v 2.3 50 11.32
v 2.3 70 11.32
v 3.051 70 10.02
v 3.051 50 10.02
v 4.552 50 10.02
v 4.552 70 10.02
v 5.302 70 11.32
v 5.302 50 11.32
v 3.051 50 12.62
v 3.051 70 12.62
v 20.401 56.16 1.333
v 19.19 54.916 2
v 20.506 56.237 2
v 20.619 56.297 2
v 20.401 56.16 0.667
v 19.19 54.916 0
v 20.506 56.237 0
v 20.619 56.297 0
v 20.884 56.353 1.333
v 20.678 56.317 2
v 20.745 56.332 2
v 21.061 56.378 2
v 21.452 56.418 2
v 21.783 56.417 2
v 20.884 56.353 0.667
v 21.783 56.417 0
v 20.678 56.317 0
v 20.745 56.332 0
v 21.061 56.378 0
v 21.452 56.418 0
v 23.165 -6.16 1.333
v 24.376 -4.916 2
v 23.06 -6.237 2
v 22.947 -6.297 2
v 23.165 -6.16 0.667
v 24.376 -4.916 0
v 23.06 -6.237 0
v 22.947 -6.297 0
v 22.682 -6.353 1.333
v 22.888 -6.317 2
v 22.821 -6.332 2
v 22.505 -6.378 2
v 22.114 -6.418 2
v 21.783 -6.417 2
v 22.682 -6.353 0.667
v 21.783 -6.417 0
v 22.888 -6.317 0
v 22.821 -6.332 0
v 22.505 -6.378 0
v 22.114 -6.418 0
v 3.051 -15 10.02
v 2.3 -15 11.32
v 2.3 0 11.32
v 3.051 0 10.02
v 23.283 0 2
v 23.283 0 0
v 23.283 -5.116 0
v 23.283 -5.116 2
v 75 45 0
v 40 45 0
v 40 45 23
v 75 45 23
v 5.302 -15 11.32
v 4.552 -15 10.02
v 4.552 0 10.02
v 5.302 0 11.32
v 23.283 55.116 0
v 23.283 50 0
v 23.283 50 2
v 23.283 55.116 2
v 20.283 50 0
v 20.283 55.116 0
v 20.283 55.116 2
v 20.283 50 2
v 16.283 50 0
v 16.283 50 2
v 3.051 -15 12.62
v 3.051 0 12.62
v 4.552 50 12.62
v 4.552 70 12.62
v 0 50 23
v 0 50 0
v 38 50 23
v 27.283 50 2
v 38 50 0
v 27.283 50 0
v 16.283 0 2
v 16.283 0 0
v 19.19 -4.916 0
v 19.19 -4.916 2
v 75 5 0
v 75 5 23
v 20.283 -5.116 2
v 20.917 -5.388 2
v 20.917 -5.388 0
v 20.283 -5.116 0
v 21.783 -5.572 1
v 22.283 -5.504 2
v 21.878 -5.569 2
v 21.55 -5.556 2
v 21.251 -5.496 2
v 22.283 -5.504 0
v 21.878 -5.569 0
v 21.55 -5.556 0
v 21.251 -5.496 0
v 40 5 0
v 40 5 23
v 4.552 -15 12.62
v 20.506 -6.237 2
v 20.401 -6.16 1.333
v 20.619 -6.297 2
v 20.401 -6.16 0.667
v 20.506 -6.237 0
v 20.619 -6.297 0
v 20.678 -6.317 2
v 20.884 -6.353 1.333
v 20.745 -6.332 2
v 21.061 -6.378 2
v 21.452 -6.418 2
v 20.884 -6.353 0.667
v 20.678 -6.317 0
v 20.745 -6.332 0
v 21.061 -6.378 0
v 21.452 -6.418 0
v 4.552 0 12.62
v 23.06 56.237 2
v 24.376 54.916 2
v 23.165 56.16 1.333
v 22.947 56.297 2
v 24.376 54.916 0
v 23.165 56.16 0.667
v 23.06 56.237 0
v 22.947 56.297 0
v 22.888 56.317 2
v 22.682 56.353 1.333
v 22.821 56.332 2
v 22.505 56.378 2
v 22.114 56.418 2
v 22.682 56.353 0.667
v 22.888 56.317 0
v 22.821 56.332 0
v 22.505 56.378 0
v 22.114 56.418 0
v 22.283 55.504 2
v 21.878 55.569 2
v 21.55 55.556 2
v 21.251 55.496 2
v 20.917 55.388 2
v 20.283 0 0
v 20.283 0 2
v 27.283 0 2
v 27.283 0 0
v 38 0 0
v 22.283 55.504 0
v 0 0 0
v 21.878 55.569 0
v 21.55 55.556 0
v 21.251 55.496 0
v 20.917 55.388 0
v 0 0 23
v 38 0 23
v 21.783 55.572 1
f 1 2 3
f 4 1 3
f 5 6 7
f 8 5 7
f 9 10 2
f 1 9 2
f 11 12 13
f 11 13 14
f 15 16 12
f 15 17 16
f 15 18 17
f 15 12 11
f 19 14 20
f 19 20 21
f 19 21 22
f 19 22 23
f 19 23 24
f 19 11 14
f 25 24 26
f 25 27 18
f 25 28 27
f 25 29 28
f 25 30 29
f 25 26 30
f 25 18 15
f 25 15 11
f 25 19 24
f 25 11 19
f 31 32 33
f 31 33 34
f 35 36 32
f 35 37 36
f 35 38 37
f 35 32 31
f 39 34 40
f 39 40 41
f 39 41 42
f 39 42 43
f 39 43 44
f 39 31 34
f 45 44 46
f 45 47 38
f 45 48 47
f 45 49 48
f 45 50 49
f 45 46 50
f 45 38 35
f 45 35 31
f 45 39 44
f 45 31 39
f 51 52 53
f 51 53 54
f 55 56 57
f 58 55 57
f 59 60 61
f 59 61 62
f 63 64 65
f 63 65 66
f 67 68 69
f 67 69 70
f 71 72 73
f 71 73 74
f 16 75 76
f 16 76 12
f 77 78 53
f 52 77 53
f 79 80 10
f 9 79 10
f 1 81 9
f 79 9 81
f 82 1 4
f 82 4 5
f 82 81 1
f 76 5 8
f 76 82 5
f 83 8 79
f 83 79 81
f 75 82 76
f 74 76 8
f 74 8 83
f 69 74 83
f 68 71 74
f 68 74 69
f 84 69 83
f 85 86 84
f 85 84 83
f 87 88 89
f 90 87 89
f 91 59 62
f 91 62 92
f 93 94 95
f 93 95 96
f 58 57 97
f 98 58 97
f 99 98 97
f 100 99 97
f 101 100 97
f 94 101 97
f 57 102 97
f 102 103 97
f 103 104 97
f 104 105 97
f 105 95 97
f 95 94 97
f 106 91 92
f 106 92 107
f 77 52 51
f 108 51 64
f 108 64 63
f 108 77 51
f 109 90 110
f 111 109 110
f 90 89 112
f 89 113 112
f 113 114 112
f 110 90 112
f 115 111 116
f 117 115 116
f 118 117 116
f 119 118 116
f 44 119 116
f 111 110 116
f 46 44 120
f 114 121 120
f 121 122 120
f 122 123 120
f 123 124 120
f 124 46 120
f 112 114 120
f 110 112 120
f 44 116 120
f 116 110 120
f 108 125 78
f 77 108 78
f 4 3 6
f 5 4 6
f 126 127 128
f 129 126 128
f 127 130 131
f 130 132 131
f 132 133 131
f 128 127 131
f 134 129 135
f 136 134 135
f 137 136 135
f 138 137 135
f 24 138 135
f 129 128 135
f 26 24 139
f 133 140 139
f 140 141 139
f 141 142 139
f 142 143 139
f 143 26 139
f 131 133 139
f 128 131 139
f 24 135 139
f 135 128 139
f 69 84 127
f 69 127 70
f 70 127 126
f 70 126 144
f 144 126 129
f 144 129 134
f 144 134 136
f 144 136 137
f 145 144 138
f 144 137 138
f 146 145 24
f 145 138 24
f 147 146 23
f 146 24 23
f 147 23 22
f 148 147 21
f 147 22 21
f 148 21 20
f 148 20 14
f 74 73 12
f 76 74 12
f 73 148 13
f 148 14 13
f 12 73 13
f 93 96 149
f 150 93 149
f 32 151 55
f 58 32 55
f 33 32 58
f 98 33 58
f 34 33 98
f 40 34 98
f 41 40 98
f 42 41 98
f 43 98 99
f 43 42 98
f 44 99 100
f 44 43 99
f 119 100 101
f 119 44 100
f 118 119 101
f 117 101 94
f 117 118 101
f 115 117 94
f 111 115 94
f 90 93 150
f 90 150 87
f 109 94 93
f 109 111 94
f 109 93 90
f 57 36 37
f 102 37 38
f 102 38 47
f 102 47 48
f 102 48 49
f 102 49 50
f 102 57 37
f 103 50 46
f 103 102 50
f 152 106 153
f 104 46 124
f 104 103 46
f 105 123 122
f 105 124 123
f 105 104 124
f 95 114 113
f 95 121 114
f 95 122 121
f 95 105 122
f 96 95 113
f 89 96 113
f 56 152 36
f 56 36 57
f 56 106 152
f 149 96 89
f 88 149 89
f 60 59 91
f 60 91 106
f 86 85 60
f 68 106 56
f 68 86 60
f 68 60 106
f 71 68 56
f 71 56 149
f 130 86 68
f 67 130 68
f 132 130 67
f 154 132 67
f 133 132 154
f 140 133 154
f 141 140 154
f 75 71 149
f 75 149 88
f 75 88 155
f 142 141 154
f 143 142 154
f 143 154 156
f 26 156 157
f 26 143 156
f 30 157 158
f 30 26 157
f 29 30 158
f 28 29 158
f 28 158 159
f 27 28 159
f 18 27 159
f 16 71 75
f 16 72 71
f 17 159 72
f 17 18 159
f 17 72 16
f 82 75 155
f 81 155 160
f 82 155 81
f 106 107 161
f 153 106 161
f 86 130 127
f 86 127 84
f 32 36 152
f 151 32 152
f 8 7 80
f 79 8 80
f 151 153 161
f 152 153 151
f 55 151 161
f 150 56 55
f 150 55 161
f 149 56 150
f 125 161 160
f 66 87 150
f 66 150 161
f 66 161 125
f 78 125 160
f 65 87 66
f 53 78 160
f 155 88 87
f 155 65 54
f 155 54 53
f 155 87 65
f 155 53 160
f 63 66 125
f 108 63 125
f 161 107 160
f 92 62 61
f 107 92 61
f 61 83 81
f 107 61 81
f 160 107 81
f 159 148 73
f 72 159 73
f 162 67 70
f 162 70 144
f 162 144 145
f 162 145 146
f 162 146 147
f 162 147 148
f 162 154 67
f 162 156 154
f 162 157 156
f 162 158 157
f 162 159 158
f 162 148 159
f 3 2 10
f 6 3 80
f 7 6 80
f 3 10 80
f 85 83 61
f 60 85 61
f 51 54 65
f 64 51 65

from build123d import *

# Parameters (mm, degrees)
BOSS_EXTRUDE1_DEPTH      = 23
BOSS_EXTRUDE2_DEPTH      = 2
BOSS_EXTRUDE3_DEPTH      = 15
BOSS_EXTRUDE3_DEPTH_BACK = 70


with BuildPart() as part:
    # Sketch1 → Boss-Extrude1 (new body)
    with BuildSketch(Plane.XY):
        Polygon((38, 50), (40, 45), (75, 45), (75, 5), (40, 5), (38, 0), (0, 0), (0, 50), align=None)
    extrude(amount=BOSS_EXTRUDE1_DEPTH)

    # Sketch2 → Boss-Extrude2 (add)
    with BuildSketch(Plane(origin=(0, 0, 0), x_dir=(-1, 0, 0), z_dir=(0, 0, -1))):
        with BuildLine():
            Line((-24.376413311, 54.915521171), (-27.283060583, 50))
            Line((-27.283060583, 50), (-23.283060583, 50))
            Line((-23.283060583, 50), (-23.283060583, 55.116465729))
            add(Edge.make_bspline(
                [(-23.283060583, 55.116465729), (-22.783060583, 55.344163988), (-21.783060583, 55.799560505), (-20.783060583, 55.344163988), (-20.283060583, 55.116465729)],
                knots=[0, 0, 0, 0, 0.5, 1, 1, 1, 1], degree=3))
            Line((-20.283060583, 55.116465729), (-20.283060583, 50))
            Line((-20.283060583, 50), (-16.283060583, 50))
            Line((-16.283060583, 50), (-19.189707855, 54.915521171))
            add(Edge.make_bspline(
                [(-19.189707855, 54.915521171), (-19.646594621, 55.426566158), (-20.482340041, 56.318719988), (-20.795963928, 56.329848385), (-21.430200541, 56.439930134), (-21.783060583, 56.416877275)],
                knots=[0, 0, 0, 0, 0.318153244, 0.553620623, 0.81642651, 0.81642651, 0.81642651, 0.81642651], degree=3))
            add(Edge.make_bspline(
                [(-24.376413311, 54.915521171), (-23.919526545, 55.426566158), (-23.083781124, 56.318719988), (-22.770157237, 56.329848385), (-22.135920624, 56.439930134), (-21.783060583, 56.416877275)],
                knots=[0, 0, 0, 0, 0.318153244, 0.553620623, 0.81642651, 0.81642651, 0.81642651, 0.81642651], degree=3))
        make_face()
    boss_extrude2 = extrude(amount=-BOSS_EXTRUDE2_DEPTH)

    # Mirror1: Boss-Extrude2 across plane
    add(boss_extrude2.mirror(Plane.ZX.offset(25)))

    # Sketch3 → Boss-Extrude3 (add, two sides: drawn at the far end of the back side and taken through both)
    with BuildSketch(Plane.XZ.offset(-BOSS_EXTRUDE3_DEPTH_BACK)):
        Polygon((5.3022214, 11.32), (4.55166605, 12.62), (3.05055535, 12.62), (2.3, 11.32), (3.05055535, 10.02), (4.55166605, 10.02), align=None)
    extrude(amount=BOSS_EXTRUDE3_DEPTH + BOSS_EXTRUDE3_DEPTH_BACK)


solid = part.part
